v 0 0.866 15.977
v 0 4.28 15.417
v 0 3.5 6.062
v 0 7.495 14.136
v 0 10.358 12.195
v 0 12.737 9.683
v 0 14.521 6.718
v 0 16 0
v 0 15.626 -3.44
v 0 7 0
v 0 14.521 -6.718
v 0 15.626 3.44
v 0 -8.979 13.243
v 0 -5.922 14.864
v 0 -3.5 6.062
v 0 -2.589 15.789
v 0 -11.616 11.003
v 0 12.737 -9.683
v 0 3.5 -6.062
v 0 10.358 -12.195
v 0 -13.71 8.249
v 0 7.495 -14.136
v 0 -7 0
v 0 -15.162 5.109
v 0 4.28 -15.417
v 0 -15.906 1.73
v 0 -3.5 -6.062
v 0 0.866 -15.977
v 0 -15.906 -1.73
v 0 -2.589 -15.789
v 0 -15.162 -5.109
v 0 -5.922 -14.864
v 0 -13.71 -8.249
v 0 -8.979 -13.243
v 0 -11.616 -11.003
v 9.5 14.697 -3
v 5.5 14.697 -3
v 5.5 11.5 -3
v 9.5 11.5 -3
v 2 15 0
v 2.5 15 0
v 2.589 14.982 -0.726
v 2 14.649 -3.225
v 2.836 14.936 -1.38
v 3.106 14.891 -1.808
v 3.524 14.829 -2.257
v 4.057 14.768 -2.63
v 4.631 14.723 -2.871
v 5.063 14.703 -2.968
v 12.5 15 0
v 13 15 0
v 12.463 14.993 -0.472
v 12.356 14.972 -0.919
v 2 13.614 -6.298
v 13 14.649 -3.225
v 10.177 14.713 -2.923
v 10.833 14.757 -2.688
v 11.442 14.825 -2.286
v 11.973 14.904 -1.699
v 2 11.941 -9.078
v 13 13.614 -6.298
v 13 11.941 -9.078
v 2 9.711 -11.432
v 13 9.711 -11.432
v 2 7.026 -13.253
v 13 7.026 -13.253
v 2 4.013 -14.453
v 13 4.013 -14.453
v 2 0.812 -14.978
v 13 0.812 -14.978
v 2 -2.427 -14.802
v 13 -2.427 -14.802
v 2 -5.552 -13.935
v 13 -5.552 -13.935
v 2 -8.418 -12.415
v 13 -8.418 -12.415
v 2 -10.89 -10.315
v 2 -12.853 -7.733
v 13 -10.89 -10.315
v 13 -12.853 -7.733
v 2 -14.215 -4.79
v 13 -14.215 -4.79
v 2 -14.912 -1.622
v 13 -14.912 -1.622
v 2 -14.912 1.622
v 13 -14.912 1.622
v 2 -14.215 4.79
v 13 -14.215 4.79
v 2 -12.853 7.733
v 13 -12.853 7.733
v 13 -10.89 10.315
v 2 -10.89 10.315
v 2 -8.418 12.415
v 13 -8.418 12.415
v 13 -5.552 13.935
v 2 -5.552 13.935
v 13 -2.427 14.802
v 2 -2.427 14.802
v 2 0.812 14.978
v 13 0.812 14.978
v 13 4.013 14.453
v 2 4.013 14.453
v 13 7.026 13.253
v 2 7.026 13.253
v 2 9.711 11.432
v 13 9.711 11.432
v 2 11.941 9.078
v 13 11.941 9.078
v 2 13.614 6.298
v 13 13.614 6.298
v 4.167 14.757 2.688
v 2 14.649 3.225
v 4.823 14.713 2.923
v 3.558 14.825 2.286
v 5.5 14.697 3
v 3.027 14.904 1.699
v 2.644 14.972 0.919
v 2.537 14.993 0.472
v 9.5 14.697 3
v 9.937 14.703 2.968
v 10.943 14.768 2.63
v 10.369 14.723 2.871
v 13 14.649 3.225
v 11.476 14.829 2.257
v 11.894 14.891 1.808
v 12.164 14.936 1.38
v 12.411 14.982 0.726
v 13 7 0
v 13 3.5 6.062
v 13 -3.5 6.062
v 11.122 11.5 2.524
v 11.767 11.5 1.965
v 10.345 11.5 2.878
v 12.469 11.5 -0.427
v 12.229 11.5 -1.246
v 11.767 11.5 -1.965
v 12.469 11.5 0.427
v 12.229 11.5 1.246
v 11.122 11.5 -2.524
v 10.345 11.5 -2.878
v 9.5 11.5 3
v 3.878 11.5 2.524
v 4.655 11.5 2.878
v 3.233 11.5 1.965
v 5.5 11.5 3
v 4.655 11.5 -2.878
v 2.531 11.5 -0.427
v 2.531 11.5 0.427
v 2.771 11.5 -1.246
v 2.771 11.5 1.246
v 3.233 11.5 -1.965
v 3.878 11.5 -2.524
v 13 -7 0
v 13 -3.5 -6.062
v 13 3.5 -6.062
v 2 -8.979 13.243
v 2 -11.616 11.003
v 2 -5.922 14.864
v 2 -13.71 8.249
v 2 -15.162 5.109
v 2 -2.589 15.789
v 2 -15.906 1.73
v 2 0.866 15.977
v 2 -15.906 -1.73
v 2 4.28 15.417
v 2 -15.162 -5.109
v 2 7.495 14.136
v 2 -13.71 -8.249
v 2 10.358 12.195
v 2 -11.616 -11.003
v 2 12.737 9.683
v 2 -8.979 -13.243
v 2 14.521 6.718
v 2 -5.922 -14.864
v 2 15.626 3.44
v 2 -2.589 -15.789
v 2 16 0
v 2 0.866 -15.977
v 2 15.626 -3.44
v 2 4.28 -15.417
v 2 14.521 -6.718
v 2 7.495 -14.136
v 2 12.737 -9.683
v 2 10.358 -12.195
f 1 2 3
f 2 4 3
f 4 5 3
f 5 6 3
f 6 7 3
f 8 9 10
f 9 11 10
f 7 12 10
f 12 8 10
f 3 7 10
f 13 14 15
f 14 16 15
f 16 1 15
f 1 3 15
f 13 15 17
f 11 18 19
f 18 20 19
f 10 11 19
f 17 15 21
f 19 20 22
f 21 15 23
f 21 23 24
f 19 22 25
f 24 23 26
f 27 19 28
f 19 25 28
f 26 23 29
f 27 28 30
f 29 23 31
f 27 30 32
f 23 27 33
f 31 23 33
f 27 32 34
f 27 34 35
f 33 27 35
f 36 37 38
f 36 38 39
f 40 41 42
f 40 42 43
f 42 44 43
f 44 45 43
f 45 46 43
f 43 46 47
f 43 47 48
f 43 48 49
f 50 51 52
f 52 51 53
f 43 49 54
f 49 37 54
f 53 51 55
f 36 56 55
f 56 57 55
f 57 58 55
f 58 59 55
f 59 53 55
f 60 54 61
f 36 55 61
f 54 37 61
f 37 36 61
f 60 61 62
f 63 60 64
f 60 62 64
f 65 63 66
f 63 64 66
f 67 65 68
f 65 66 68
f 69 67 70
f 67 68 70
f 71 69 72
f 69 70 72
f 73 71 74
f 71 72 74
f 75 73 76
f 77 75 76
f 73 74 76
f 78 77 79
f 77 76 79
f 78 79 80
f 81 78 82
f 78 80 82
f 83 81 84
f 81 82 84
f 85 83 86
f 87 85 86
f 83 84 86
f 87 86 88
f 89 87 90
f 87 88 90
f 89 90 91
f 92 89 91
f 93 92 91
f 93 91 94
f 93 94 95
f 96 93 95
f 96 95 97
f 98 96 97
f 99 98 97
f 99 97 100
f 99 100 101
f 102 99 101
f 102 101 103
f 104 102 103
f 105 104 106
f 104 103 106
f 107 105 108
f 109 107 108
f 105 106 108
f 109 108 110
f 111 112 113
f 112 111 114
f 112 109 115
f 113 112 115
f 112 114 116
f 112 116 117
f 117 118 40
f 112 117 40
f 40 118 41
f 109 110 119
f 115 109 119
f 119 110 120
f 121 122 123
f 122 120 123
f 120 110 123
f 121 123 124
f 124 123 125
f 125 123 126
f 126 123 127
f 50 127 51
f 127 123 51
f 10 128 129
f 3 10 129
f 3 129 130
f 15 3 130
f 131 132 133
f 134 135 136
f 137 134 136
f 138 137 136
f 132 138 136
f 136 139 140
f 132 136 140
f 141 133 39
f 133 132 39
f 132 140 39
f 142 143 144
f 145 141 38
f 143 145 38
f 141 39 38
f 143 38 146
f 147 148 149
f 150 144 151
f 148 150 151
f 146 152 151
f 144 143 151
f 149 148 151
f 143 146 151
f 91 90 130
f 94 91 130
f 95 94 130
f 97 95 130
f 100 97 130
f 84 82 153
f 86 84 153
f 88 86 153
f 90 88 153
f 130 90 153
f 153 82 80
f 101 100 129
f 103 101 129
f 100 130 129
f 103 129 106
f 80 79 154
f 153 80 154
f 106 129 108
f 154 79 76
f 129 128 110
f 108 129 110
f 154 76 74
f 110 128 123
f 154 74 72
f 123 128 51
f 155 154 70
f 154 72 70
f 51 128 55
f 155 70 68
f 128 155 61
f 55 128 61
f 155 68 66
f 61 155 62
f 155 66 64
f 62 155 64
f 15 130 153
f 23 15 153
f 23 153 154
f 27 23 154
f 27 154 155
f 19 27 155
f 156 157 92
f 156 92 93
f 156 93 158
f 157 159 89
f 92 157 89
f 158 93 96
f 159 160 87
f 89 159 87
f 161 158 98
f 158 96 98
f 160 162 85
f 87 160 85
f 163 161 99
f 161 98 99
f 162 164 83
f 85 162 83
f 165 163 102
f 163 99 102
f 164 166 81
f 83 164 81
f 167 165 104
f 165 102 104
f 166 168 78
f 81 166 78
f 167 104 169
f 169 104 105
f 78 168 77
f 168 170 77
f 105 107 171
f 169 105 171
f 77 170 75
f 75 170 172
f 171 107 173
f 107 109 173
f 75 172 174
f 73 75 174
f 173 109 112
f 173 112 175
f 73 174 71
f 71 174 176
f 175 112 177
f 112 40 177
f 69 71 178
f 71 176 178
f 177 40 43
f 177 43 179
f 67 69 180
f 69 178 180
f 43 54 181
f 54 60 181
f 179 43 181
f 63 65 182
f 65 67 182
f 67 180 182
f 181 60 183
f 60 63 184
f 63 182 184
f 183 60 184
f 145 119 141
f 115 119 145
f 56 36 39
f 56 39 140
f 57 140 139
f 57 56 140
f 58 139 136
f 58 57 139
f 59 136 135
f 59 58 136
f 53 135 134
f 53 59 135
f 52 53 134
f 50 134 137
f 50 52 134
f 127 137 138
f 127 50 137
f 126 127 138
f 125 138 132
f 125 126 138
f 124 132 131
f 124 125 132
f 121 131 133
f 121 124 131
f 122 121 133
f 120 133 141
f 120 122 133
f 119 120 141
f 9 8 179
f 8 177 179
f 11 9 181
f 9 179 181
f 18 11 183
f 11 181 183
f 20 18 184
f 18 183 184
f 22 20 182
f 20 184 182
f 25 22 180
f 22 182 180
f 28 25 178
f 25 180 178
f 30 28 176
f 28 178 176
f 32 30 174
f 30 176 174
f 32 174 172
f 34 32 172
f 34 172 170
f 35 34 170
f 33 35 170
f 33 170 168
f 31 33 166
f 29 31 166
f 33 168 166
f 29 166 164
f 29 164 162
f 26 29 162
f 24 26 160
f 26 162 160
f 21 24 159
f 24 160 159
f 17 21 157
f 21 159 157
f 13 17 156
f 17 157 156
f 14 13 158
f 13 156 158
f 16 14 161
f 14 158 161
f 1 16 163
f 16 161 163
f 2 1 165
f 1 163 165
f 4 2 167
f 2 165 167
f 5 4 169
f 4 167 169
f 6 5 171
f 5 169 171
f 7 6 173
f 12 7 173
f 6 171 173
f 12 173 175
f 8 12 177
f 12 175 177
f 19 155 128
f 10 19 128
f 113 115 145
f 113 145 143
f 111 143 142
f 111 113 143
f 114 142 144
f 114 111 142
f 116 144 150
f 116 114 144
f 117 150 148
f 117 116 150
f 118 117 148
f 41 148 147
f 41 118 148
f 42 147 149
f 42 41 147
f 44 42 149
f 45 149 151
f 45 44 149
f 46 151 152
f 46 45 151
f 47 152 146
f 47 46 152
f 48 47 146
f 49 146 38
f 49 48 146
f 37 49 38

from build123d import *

# Parameters (mm, degrees)
CUT_EXTRUDE1_DEPTH = 27.095976701
CUT_EXTRUDE2_DEPTH = 3.5


with BuildPart() as part:
    # Sketch1 → Revolve1 (revolve)
    with BuildSketch(Plane.XY):
        Polygon((0, 0), (0, 16), (2, 16), (2, 15), (13, 15), (13, 0), align=None)
    revolve(axis=Axis((13, 0, 0), (-1, 0, 0)))

    # Sketch2 → Cut-Extrude1 (cut, through all)
    with BuildSketch(Plane(origin=(13, 0, 0), x_dir=(0, 0, -1), z_dir=(1, 0, 0))):
        Polygon((0, 7), (-6.062177826, 3.5), (-6.062177826, -3.5), (0, -7), (6.062177826, -3.5), (6.062177826, 3.5), align=None)
    extrude(amount=-CUT_EXTRUDE1_DEPTH, mode=Mode.SUBTRACT)

    # Sketch3 → Cut-Extrude2 (cut)
    with BuildSketch(Plane(origin=(0, 15, 0), x_dir=(1, 0, 0), z_dir=(0, 1, 0))):
        with BuildLine():
            Line((5.5, 3), (9.5, 3))
            ThreePointArc((9.5, 3), (12.5, 0), (9.5, -3))
            Line((9.5, -3), (5.5, -3))
            ThreePointArc((5.5, -3), (2.5, 0), (5.5, 3))
        make_face()
    extrude(amount=-CUT_EXTRUDE2_DEPTH, mode=Mode.SUBTRACT)


solid = part.part
